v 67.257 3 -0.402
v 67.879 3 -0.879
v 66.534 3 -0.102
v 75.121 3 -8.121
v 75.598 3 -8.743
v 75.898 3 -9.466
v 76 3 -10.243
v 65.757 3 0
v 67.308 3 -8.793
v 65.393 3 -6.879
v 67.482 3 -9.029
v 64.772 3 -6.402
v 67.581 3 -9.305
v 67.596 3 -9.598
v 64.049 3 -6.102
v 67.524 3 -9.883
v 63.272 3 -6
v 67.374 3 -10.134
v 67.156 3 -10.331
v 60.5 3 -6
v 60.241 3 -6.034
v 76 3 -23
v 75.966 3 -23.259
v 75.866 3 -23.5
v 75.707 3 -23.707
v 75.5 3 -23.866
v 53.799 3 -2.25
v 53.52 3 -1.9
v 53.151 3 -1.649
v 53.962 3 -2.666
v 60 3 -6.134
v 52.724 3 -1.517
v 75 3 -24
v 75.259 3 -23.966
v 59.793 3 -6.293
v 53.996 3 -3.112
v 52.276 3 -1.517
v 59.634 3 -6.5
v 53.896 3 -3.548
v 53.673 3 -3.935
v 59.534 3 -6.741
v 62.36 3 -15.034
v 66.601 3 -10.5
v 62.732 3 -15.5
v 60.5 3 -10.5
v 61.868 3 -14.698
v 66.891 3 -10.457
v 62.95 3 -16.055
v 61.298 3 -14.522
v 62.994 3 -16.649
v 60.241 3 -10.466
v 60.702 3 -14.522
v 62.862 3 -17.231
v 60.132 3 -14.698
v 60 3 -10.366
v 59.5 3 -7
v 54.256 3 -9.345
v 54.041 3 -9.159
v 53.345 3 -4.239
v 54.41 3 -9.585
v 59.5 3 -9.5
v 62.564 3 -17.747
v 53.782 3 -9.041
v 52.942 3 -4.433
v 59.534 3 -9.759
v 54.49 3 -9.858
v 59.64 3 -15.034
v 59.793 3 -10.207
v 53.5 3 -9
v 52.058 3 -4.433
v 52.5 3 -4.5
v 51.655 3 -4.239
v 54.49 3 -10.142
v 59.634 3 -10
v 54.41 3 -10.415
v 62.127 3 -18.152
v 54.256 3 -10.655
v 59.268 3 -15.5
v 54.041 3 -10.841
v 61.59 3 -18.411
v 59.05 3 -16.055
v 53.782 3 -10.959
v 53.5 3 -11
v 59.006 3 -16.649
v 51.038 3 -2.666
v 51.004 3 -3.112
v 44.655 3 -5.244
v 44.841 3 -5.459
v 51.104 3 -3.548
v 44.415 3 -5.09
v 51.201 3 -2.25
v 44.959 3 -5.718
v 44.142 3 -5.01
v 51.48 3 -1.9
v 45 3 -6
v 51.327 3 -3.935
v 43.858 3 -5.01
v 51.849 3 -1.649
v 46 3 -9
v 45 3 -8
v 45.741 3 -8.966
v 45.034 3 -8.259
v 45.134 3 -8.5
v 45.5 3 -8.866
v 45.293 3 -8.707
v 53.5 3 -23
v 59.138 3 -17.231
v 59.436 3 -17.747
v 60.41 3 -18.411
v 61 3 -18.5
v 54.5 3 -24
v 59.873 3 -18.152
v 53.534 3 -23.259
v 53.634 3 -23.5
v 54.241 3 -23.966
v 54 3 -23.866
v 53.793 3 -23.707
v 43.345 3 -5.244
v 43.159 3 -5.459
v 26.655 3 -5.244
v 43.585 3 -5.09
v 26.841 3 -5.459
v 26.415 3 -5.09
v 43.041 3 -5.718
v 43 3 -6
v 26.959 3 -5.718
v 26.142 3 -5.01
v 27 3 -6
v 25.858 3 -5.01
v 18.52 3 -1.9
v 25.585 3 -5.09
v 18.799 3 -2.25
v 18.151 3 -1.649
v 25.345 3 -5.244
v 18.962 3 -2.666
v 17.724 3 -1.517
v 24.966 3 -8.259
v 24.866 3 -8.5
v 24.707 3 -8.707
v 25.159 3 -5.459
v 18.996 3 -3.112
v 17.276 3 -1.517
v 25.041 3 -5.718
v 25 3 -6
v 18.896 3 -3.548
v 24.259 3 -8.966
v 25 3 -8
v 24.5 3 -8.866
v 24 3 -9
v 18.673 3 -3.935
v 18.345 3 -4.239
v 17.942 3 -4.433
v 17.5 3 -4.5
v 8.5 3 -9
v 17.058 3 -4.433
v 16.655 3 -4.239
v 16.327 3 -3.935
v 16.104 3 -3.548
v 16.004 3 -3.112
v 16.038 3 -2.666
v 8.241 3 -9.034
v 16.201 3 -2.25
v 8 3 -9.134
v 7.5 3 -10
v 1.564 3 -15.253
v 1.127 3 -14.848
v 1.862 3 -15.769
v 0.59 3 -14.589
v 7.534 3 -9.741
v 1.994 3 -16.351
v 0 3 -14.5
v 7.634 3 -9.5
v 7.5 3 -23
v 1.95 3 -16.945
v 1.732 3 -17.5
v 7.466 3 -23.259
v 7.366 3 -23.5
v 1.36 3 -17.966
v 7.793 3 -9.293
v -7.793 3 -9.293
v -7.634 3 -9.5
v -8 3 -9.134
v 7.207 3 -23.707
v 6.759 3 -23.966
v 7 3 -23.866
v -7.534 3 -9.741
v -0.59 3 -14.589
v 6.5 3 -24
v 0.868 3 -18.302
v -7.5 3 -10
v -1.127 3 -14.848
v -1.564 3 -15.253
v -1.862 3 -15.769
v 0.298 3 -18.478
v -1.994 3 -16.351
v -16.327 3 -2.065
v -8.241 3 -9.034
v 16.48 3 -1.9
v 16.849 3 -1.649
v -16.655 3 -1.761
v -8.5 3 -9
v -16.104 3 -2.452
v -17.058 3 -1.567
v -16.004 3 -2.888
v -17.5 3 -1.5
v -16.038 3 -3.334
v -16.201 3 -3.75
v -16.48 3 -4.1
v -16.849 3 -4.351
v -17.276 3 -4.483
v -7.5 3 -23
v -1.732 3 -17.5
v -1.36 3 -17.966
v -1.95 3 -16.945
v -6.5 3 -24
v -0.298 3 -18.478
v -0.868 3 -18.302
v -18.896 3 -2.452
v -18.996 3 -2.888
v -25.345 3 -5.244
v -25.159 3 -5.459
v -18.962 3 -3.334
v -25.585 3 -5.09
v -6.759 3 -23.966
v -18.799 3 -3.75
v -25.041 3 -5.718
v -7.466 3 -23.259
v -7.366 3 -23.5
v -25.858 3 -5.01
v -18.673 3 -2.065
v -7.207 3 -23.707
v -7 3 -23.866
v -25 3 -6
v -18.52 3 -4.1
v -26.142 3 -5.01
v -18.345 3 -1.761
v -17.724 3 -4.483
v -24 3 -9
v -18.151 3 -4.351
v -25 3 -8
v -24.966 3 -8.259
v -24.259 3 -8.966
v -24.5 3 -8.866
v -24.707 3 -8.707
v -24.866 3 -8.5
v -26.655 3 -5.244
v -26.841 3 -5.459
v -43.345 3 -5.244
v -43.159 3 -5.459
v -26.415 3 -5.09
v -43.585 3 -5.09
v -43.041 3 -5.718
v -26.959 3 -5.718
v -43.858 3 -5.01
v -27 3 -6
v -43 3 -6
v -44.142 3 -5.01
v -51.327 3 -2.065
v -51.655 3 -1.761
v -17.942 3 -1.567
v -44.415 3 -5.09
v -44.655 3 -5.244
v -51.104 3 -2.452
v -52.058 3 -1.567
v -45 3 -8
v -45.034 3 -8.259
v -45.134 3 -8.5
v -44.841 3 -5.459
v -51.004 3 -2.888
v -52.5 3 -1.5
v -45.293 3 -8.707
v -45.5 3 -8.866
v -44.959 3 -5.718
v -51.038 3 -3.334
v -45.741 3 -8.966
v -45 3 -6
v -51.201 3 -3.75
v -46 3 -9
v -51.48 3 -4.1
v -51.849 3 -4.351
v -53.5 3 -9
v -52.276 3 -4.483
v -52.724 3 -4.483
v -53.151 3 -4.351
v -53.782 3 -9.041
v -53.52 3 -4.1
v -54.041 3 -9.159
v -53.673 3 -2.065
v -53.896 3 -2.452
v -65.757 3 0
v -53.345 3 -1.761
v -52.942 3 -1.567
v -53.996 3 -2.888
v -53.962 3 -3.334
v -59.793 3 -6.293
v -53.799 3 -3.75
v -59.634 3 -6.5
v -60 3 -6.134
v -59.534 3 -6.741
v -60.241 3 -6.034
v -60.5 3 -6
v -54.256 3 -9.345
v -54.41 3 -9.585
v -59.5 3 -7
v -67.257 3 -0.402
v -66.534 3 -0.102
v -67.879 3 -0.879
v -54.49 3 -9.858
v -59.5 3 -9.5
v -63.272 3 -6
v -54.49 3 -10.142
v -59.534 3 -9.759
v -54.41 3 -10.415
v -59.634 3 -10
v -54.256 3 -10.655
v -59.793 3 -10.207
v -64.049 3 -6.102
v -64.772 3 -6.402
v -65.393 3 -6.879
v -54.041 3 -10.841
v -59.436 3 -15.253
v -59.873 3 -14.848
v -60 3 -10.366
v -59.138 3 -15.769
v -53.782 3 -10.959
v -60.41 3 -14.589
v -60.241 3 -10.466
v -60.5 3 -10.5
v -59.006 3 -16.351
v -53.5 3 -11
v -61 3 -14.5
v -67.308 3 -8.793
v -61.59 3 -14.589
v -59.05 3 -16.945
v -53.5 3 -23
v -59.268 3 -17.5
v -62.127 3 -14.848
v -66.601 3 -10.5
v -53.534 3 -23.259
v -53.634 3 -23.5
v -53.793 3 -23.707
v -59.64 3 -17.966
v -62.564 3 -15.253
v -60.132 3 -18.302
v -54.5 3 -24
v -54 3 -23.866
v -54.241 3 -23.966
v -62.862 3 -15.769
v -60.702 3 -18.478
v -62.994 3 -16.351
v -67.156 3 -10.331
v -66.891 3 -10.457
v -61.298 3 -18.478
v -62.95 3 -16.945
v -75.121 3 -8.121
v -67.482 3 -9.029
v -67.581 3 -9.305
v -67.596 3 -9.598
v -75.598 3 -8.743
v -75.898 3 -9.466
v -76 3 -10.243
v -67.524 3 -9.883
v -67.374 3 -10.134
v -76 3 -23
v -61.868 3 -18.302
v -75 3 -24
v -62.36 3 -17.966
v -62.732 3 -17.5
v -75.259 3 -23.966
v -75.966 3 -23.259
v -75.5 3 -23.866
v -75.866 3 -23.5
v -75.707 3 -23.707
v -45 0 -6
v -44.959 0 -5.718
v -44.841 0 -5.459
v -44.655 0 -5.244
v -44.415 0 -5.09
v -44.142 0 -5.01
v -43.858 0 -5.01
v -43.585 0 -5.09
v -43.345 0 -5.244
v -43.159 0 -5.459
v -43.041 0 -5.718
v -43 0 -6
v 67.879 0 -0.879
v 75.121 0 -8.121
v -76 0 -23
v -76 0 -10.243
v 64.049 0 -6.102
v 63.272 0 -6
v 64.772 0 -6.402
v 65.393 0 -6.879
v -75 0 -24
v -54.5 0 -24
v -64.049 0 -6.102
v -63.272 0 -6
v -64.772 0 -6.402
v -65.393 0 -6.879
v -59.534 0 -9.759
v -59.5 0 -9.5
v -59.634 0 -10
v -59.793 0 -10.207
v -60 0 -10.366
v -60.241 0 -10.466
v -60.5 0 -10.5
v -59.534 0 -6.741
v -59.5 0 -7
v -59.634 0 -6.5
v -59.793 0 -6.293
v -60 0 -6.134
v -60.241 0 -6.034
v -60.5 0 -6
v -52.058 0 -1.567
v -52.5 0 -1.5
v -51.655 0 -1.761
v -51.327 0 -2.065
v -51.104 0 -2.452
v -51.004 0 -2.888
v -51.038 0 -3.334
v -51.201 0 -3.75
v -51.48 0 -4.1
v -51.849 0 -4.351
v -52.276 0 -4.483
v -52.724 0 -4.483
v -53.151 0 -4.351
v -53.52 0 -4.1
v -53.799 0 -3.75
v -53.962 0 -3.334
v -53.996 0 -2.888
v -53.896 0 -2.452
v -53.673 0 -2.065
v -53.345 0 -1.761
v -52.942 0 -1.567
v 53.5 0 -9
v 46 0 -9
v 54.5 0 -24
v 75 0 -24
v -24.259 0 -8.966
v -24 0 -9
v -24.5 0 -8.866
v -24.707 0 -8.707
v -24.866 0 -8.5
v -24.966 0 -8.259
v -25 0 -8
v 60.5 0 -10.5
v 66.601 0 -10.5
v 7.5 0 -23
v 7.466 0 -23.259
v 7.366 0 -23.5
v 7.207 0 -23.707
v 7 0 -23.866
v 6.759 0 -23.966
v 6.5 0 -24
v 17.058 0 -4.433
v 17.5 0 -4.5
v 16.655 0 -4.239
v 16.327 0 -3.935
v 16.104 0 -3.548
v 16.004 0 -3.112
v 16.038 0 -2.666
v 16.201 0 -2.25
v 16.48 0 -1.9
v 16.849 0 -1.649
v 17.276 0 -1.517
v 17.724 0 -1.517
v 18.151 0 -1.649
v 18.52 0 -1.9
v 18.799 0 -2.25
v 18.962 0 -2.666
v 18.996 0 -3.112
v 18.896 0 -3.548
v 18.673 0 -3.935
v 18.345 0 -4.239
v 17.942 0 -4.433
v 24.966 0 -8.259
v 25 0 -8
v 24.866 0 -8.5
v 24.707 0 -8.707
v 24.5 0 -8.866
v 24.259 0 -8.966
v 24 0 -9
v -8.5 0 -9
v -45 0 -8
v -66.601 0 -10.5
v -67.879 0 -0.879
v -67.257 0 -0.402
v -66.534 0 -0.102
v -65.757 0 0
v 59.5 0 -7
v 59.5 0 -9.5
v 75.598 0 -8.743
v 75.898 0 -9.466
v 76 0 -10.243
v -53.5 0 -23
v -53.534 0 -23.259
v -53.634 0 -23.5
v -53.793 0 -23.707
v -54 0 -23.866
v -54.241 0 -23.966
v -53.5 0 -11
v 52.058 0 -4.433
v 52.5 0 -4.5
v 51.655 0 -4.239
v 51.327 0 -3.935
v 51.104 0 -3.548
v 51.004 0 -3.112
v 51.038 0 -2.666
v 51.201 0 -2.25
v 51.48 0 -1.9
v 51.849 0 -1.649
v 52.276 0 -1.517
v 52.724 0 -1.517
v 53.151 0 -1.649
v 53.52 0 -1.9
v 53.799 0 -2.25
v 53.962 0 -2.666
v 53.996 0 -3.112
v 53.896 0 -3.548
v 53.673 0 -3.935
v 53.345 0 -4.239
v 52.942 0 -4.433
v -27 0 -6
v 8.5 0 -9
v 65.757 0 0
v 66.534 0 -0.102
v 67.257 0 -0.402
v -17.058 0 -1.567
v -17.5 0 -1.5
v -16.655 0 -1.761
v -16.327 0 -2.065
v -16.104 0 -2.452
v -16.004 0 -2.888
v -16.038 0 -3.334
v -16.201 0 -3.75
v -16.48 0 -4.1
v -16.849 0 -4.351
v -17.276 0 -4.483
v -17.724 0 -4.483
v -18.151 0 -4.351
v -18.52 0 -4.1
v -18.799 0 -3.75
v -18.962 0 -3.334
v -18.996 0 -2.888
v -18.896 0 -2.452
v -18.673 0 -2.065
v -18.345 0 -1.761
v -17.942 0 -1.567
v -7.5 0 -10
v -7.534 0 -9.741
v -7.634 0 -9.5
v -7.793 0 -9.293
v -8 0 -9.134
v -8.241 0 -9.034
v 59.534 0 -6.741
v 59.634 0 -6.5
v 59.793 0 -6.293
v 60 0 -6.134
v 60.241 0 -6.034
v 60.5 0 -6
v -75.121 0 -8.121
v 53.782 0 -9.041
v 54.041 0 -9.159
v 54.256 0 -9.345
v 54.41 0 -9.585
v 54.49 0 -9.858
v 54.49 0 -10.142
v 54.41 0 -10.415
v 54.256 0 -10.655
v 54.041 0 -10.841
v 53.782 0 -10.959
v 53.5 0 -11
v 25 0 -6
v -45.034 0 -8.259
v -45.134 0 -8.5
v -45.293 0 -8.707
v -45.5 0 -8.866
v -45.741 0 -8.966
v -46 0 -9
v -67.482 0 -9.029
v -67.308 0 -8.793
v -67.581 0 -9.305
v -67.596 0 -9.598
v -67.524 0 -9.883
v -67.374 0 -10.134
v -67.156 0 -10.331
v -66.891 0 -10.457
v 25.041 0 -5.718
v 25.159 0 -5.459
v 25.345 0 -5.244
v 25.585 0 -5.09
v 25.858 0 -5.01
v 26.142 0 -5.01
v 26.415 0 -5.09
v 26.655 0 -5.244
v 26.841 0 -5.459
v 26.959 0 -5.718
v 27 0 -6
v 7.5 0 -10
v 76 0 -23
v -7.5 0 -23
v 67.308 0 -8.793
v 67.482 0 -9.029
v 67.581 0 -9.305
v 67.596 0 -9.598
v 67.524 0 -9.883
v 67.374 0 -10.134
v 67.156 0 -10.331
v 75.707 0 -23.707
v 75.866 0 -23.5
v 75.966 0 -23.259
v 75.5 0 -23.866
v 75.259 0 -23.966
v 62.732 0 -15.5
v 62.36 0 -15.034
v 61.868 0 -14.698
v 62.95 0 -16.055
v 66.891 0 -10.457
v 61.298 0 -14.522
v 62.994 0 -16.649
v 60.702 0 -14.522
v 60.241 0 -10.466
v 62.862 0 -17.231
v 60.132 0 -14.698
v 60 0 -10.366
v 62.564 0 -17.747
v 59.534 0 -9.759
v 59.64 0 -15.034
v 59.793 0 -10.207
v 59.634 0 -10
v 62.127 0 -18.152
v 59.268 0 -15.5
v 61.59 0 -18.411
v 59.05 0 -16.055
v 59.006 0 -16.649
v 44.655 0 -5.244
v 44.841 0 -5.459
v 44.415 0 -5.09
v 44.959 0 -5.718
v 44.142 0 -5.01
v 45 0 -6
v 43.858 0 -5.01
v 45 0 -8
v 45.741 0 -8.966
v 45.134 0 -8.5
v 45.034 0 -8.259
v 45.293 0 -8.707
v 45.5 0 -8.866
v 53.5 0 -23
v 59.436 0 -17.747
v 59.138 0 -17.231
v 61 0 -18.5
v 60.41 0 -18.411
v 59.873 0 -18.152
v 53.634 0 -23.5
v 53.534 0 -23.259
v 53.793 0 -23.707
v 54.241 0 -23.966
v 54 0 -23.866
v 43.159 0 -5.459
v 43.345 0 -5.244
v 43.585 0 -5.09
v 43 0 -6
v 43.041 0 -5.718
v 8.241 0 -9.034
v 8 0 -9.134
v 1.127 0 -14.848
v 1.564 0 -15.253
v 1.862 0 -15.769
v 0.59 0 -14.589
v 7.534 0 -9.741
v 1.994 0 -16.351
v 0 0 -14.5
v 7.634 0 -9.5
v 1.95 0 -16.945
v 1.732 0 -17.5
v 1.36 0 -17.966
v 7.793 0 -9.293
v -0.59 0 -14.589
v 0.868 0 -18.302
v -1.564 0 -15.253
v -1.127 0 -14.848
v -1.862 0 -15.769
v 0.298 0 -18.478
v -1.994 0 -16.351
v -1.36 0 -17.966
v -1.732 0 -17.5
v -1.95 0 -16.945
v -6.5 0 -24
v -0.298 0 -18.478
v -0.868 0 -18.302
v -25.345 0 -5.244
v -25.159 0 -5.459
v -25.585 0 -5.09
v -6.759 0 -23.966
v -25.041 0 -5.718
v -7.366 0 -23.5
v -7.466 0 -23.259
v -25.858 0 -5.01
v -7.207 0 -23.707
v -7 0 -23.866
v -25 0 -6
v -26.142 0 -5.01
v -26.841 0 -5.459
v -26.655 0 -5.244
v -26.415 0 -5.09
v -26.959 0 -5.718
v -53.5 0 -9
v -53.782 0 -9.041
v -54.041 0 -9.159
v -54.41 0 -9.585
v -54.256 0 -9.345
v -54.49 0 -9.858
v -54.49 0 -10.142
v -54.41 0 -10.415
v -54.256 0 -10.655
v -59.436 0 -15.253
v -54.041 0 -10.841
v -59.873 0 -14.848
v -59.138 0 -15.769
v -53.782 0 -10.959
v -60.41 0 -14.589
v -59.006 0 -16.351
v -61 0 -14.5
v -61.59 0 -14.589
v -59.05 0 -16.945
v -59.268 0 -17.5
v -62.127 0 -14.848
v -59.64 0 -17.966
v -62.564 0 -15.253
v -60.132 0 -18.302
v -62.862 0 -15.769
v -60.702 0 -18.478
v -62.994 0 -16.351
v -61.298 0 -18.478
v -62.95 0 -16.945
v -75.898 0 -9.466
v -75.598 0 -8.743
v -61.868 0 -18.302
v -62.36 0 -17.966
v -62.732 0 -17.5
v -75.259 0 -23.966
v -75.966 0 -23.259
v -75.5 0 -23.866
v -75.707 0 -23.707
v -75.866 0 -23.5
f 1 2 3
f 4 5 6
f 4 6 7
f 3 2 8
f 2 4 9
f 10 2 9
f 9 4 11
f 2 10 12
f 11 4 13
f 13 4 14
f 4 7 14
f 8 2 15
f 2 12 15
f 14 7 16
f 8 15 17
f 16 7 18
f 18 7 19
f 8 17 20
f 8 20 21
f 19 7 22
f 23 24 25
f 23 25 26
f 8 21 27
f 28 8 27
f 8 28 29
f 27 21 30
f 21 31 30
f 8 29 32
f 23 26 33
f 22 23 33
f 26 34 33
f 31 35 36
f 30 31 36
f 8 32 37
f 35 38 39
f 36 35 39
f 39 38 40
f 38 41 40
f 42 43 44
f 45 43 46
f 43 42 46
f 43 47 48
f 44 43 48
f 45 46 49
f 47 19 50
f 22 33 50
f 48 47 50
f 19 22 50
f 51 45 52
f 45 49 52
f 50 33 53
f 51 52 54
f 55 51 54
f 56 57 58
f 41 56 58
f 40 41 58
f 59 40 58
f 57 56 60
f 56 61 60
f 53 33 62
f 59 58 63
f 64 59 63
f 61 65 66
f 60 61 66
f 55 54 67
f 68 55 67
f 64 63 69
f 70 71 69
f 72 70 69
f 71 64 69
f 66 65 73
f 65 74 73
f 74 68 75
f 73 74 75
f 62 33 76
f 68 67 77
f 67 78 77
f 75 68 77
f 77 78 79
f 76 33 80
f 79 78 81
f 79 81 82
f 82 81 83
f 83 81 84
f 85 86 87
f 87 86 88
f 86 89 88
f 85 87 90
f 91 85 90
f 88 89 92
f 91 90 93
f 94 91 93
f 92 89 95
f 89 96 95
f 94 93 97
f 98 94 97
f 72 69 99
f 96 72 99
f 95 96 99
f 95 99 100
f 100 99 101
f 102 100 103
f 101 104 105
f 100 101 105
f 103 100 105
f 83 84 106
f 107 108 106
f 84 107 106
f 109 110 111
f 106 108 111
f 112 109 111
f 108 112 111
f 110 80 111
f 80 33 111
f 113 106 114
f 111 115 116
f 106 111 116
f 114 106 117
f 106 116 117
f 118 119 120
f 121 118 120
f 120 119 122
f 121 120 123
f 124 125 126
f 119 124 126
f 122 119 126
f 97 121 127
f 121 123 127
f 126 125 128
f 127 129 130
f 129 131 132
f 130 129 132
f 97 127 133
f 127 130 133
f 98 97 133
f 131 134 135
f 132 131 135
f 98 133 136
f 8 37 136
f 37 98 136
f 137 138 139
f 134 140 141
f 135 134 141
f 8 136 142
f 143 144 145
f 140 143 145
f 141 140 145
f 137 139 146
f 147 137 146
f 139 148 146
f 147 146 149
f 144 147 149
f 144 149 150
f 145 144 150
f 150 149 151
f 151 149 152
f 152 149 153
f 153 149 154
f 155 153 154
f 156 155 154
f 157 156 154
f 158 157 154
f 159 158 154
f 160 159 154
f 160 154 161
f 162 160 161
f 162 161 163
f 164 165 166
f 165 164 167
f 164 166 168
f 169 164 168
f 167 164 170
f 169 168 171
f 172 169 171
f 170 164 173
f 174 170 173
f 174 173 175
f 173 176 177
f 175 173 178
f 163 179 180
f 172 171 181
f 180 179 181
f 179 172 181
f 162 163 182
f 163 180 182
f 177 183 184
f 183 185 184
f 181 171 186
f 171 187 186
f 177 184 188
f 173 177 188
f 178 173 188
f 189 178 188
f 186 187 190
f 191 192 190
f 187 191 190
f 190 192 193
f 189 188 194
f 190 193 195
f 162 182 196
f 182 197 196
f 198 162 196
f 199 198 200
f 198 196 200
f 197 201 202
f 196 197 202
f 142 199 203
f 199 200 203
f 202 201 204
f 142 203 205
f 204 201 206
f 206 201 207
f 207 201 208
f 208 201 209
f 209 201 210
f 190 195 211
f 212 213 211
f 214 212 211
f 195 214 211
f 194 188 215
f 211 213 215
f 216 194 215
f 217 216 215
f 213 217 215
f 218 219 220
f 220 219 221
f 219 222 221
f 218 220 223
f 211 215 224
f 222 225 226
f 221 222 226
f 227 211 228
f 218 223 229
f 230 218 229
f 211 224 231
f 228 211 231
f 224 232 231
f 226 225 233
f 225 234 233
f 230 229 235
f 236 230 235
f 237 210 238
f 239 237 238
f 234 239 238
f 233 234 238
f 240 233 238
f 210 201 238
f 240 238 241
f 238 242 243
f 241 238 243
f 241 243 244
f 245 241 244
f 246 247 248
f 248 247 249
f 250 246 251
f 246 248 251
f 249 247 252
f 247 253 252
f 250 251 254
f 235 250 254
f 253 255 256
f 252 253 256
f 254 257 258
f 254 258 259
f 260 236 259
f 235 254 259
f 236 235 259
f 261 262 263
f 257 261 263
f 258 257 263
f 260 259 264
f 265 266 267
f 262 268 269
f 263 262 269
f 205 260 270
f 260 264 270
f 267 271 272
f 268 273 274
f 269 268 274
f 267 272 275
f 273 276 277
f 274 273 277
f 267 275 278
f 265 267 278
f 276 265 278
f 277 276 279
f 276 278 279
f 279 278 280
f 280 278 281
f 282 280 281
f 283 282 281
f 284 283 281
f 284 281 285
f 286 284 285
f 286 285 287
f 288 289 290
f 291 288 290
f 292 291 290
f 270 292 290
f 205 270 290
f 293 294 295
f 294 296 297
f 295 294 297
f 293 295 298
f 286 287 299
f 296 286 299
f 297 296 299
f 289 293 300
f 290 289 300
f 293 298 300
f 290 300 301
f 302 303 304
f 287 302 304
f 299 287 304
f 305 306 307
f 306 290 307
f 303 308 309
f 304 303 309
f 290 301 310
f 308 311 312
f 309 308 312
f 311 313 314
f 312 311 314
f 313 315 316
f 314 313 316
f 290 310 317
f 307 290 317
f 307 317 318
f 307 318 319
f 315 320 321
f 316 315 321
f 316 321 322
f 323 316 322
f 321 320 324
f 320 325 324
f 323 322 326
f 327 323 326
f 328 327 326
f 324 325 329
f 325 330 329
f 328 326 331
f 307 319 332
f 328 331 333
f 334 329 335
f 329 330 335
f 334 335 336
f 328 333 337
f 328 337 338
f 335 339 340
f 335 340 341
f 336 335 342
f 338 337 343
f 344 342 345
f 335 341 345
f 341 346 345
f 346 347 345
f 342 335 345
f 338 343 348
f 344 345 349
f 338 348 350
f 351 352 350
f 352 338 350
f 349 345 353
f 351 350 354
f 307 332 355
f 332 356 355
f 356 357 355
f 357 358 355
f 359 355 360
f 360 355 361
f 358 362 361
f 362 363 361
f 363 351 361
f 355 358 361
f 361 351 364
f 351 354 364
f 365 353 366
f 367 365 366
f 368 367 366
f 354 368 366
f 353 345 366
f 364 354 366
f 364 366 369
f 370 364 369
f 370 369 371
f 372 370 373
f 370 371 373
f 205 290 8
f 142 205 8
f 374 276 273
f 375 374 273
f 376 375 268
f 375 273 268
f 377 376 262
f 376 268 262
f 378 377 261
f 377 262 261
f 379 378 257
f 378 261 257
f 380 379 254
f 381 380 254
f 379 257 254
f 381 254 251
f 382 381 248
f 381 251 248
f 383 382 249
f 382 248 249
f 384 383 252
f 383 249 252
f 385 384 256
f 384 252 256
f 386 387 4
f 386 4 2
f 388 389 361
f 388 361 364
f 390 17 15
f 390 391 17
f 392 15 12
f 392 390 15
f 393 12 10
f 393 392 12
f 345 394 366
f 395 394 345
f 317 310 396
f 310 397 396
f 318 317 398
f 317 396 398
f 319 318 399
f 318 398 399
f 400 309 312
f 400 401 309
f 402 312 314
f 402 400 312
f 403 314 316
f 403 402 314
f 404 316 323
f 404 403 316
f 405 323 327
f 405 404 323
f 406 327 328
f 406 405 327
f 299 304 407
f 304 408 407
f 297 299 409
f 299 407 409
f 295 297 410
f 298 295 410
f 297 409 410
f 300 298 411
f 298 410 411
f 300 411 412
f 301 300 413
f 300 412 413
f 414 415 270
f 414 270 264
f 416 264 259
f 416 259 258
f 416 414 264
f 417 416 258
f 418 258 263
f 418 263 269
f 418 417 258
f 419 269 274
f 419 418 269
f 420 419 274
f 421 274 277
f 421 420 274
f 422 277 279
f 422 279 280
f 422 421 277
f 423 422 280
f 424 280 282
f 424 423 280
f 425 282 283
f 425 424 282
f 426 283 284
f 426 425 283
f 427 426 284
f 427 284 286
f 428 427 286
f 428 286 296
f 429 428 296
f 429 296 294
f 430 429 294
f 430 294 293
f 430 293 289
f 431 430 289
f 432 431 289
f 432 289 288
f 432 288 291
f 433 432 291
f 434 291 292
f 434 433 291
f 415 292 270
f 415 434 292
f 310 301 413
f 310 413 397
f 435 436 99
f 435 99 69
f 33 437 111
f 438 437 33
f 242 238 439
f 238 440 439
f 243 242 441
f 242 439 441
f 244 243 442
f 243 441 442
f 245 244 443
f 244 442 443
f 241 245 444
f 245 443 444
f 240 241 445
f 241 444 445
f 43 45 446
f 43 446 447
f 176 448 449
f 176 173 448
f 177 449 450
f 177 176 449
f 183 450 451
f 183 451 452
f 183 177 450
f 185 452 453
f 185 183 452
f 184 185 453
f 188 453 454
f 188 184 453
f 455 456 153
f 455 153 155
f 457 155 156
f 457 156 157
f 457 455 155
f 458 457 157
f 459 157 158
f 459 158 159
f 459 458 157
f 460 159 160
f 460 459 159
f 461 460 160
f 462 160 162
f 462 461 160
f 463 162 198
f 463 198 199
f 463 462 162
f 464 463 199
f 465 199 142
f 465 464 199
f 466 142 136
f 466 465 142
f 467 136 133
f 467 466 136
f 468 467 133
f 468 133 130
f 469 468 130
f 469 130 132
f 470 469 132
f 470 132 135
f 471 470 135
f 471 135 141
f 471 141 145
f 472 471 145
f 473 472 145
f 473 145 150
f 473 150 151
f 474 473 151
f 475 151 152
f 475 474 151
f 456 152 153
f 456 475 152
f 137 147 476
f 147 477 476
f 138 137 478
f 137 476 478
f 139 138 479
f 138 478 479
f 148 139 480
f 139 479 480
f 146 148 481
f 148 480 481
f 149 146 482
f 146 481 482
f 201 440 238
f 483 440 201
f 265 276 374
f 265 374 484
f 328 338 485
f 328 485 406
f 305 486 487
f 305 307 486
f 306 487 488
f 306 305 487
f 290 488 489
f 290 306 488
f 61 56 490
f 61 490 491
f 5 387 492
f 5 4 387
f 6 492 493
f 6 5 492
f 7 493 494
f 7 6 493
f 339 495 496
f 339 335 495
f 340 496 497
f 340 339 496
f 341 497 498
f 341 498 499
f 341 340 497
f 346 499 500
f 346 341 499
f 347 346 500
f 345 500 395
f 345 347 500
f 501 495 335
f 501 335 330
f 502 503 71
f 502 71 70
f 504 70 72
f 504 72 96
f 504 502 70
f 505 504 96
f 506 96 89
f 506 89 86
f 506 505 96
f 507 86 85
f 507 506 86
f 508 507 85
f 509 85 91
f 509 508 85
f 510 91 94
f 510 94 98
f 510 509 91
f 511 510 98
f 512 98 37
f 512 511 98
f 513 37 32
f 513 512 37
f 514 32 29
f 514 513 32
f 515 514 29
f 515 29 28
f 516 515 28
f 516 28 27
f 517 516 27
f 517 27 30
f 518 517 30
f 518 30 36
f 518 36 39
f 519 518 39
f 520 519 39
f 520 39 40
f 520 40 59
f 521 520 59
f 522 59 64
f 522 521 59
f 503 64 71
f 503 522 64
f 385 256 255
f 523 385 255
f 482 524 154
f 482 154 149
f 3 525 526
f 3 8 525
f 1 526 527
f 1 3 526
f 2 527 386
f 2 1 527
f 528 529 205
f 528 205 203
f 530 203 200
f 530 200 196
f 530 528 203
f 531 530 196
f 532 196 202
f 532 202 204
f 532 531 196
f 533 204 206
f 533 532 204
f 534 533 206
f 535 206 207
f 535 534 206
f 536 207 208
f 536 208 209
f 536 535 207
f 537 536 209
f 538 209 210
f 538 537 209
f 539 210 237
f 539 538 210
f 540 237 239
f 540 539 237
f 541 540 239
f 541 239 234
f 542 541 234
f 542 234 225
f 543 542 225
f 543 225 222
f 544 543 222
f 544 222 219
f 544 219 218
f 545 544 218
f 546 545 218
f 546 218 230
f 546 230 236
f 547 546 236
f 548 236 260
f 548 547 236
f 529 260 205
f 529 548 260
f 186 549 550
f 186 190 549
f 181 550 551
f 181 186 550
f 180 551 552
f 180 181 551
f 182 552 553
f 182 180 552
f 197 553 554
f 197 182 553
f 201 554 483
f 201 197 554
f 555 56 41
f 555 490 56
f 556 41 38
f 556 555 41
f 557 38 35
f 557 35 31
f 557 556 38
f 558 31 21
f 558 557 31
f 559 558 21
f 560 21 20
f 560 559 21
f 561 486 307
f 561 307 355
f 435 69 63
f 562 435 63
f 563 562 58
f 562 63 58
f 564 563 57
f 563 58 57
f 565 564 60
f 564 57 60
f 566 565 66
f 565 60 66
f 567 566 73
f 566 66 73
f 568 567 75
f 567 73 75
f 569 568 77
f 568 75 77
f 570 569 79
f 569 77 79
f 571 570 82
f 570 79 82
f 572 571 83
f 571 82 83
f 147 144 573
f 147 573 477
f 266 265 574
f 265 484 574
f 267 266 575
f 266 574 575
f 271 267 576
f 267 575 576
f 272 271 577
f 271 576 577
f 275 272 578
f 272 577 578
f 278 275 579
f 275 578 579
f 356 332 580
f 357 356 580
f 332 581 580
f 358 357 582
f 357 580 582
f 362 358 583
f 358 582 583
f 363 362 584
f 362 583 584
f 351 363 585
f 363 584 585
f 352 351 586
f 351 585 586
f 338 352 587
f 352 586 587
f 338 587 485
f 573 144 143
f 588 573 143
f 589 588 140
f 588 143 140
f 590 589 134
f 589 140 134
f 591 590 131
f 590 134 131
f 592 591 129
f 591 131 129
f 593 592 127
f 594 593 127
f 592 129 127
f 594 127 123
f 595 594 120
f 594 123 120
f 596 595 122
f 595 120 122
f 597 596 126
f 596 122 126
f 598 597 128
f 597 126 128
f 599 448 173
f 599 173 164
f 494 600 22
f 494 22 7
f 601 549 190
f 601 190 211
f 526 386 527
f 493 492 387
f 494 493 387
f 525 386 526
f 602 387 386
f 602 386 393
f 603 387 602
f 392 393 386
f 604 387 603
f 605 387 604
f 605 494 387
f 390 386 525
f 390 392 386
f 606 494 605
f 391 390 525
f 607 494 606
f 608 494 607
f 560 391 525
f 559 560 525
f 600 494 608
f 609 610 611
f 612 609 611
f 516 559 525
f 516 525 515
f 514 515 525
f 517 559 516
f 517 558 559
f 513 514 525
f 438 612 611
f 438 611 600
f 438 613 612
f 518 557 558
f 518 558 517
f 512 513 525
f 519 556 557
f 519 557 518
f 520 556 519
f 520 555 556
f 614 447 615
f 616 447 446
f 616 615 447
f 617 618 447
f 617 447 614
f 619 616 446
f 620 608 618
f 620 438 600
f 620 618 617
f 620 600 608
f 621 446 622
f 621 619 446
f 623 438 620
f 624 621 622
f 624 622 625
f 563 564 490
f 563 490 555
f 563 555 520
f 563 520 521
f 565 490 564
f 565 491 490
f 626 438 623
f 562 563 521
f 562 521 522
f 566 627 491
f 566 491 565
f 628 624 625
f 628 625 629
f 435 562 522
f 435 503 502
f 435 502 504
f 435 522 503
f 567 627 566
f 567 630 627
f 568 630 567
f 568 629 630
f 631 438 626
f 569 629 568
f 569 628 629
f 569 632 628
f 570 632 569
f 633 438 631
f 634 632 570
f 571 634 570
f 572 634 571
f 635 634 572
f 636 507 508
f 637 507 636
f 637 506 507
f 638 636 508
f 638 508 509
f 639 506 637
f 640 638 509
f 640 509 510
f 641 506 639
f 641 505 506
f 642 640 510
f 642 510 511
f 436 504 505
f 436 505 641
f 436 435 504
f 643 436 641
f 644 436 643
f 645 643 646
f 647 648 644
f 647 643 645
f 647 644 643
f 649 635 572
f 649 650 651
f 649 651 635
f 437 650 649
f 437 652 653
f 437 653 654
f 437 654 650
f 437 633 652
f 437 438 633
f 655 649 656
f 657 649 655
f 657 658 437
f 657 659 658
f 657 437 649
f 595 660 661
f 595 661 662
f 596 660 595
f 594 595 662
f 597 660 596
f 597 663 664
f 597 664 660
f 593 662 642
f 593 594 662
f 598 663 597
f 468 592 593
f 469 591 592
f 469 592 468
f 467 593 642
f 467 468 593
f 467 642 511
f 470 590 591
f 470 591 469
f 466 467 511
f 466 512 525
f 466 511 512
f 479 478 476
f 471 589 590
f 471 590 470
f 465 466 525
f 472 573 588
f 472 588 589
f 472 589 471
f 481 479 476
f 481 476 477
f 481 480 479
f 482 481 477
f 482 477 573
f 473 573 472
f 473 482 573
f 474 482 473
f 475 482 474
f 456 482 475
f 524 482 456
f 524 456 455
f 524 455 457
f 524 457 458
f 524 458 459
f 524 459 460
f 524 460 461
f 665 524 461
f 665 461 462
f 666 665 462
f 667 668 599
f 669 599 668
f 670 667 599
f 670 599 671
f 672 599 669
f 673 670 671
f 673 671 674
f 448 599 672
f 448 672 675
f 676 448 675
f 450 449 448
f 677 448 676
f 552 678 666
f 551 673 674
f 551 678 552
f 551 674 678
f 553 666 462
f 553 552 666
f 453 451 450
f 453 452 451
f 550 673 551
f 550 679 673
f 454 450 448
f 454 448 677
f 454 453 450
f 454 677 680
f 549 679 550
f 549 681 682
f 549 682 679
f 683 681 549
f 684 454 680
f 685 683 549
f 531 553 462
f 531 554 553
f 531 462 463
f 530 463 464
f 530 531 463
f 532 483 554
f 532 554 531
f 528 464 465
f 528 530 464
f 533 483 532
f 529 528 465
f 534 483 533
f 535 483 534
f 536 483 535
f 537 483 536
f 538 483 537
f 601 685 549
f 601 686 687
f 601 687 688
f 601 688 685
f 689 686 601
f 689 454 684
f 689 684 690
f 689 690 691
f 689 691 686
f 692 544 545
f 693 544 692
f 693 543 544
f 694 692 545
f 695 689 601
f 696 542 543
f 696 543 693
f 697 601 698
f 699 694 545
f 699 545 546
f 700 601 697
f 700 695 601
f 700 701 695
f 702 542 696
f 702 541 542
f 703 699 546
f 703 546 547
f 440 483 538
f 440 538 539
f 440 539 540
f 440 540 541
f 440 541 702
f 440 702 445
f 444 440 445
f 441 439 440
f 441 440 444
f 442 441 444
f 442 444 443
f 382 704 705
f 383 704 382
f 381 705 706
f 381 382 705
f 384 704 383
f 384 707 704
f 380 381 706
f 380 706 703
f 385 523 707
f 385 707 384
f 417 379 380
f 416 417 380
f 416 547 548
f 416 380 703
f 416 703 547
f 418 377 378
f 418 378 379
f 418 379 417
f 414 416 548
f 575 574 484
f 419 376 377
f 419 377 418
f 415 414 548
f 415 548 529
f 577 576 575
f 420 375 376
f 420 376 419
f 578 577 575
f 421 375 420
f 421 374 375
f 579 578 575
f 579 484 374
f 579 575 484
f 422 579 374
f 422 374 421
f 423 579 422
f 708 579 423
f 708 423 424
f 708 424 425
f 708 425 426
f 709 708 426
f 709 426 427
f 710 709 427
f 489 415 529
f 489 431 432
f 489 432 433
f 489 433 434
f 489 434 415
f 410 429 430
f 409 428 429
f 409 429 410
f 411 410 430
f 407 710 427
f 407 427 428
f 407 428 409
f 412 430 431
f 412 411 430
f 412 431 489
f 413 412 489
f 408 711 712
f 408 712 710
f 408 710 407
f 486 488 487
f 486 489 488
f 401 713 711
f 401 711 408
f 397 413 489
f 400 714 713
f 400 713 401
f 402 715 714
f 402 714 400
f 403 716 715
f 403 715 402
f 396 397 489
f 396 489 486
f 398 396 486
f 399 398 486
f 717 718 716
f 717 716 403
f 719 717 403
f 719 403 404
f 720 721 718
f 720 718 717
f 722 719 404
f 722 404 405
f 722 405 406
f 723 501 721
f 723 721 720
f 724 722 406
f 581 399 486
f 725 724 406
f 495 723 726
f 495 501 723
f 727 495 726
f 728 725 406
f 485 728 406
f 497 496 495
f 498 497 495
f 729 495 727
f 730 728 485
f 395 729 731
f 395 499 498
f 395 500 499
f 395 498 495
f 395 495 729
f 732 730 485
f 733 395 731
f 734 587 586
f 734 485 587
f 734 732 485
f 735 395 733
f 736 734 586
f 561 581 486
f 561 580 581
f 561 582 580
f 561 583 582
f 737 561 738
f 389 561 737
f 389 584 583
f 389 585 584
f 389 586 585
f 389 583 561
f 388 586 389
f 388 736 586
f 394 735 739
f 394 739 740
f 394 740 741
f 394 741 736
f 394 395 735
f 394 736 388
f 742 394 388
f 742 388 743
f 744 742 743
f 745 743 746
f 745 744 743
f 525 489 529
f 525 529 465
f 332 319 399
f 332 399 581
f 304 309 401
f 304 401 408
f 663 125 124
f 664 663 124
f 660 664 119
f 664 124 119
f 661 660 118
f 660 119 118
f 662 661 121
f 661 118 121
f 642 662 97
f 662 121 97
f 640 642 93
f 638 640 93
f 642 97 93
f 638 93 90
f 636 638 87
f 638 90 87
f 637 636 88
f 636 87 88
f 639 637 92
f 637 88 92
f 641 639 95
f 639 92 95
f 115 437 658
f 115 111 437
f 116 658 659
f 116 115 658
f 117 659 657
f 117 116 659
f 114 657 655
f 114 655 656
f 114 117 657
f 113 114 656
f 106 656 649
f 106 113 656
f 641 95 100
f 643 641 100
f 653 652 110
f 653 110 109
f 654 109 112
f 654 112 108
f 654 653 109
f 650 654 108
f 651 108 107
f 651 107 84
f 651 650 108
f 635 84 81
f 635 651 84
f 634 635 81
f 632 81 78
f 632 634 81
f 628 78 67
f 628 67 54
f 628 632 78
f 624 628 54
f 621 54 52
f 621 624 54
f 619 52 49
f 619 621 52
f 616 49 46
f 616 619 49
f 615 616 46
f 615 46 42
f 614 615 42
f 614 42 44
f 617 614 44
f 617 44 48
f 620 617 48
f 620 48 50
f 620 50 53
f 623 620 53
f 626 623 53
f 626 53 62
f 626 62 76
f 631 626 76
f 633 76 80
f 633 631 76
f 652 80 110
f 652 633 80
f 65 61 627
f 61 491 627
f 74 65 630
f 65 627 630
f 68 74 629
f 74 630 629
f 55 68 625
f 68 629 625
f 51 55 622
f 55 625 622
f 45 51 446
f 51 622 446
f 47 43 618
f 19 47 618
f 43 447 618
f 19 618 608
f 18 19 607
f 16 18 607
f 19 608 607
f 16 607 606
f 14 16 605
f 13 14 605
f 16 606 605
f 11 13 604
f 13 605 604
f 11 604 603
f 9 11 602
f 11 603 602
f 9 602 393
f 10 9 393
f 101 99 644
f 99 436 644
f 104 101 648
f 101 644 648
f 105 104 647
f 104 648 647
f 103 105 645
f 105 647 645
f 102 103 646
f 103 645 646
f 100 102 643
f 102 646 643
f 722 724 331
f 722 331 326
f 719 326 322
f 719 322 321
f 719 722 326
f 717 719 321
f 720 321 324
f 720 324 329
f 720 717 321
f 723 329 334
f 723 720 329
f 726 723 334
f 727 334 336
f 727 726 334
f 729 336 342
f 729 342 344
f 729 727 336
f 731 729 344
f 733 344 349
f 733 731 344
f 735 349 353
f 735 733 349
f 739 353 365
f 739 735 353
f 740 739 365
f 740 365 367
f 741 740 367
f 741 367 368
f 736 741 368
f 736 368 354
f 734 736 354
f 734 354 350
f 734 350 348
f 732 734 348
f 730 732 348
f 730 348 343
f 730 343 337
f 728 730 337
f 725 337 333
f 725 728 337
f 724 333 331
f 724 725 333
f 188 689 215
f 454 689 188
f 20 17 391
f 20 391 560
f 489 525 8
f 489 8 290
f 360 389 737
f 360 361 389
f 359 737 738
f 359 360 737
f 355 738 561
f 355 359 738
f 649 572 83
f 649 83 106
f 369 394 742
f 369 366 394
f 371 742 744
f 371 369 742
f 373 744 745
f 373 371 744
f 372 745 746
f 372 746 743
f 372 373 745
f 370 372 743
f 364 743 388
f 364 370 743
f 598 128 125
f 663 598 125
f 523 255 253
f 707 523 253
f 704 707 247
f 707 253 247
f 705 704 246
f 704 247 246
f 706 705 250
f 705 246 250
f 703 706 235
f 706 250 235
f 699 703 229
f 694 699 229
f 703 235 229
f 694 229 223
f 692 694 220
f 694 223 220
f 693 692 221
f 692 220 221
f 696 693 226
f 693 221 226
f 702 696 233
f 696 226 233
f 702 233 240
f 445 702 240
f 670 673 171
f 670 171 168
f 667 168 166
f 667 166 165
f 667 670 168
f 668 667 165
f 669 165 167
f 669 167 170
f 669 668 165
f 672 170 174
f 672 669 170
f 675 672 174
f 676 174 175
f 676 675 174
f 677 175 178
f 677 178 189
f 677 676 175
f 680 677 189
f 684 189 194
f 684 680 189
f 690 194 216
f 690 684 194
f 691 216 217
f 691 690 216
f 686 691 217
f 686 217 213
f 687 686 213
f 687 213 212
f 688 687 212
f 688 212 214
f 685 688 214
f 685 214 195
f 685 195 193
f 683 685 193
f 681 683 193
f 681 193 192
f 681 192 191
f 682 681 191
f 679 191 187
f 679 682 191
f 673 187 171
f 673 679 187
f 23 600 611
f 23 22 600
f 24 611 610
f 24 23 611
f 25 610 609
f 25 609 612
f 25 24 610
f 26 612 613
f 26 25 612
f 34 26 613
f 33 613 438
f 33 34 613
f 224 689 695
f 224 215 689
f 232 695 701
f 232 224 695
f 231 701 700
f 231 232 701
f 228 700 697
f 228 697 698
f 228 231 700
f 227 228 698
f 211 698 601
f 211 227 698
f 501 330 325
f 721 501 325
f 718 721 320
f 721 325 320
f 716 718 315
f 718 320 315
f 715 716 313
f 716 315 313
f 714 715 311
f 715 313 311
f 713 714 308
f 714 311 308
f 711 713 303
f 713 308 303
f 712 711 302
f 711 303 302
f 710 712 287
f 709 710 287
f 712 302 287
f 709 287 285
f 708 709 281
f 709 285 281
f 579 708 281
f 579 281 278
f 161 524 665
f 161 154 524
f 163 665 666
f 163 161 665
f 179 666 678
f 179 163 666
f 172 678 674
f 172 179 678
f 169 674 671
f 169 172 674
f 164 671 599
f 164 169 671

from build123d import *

# Parameters (mm, degrees)
SKETCH_1_R          = 2
SKETCH_1_R_2        = 1.5
EXTRUDE_1_DEPTH     = 3
SKETCH_2_W          = 20
SKETCH_2_H          = 3
CUT_EXTRUDE_1_DEPTH = 80.755877526
SKETCH_3_R          = 1
CUT_EXTRUDE_2_DEPTH = 80.755877526
FILLET_1_R          = 1
FILLET_2_R          = 3


with BuildPart() as part:
    # 草图1 → 凸台-拉伸1 (new body)
    with BuildSketch(Plane(origin=(0, 0, 0), x_dir=(1, 0, 0), z_dir=(0, 1, 0))):
        Polygon((-53.5, 24), (-53.5, 9), (-7.5, 9), (-7.5, 24), (7.5, 24), (7.5, 9), (53.5, 9), (53.5, 24), (76, 24), (76, 9), (67, 0), (-67, 0), (-76, 9), (-76, 24), align=None)
        with Locations(Location((-61, 16.5, 0), (0, 0, 270))):
            Circle(SKETCH_1_R, mode=Mode.SUBTRACT)
        with Locations(Location((-52.5, 3, 0), (0, 0, 270))):
            Circle(SKETCH_1_R_2, mode=Mode.SUBTRACT)
        with Locations(Location((-17.5, 3, 0), (0, 0, 270))):
            Circle(SKETCH_1_R_2, mode=Mode.SUBTRACT)
        with Locations(Location((0, 16.5, 0), (0, 0, 270))):
            Circle(SKETCH_1_R, mode=Mode.SUBTRACT)
        with Locations(Location((17.5, 3, 0), (0, 0, 90))):
            Circle(SKETCH_1_R_2, mode=Mode.SUBTRACT)
        with Locations(Location((52.5, 3, 0), (0, 0, 90))):
            Circle(SKETCH_1_R_2, mode=Mode.SUBTRACT)
        with Locations(Location((61, 16.5, 0), (0, 0, 90))):
            Circle(SKETCH_1_R, mode=Mode.SUBTRACT)
    extrude(amount=EXTRUDE_1_DEPTH)

    # 草图2 → 切除-拉伸1 (cut, through all)
    with BuildSketch(Plane(origin=(0, 3, 0), x_dir=(1, 0, 0), z_dir=(0, 1, 0))):
        with Locations((35, 7.5)):
            Rectangle(SKETCH_2_W, SKETCH_2_H)
        with Locations((-35, 7.5)):
            Rectangle(SKETCH_2_W, SKETCH_2_H)
        Polygon((-69.014718626, 10.5), (-59.5, 10.5), (-59.5, 6), (-64.514718626, 6), align=None)
        Polygon((64.514718626, 6), (59.5, 6), (59.5, 10.5), (69.014718626, 10.5), align=None)
    extrude(amount=-CUT_EXTRUDE_1_DEPTH, mode=Mode.SUBTRACT)

    # 草图3 → 切除-拉伸2 (cut, through all)
    with BuildSketch(Plane(origin=(0, 3, 0), x_dir=(1, 0, 0), z_dir=(0, 1, 0))):
        with Locations((-53.5, 10)):
            Circle(SKETCH_3_R)
        with Locations((-44, 6)):
            Circle(SKETCH_3_R)
        with Locations((-26, 6)):
            Circle(SKETCH_3_R)
        with Locations((26, 6)):
            Circle(SKETCH_3_R)
        with Locations((44, 6)):
            Circle(SKETCH_3_R)
        with Locations((53.5, 10)):
            Circle(SKETCH_3_R)
    extrude(amount=-CUT_EXTRUDE_2_DEPTH, mode=Mode.SUBTRACT)

    # 圆角1
    fillet_1_edges = [part.edges().sort_by_distance(p)[0] for p in [
        (45, 1.5, -9),
        (25, 1.5, -9),
        (-45, 1.5, -9),
        (-25, 1.5, -9),
        (-76, 1.5, -24),
        (-53.5, 1.5, -24),
        (-7.5, 1.5, -9),
        (-7.5, 1.5, -24),
        (7.5, 1.5, -24),
        (7.5, 1.5, -9),
        (53.5, 1.5, -24),
        (76, 1.5, -24),
        (69.014718626, 1.5, -10.5),
        (59.5, 1.5, -6),
        (59.5, 1.5, -10.5),
        (-59.5, 1.5, -6),
        (-69.014718626, 1.5, -10.5),
        (-59.5, 1.5, -10.5),
    ]]
    fillet(fillet_1_edges, radius=FILLET_1_R)

    # 圆角2
    fillet_2_edges = [part.edges().sort_by_distance(p)[0] for p in [
        (76, 1.5, -9),
        (67, 1.5, 0),
        (-67, 1.5, 0),
        (-76, 1.5, -9),
        (64.514718626, 1.5, -6),
        (-64.514718626, 1.5, -6),
    ]]
    fillet(fillet_2_edges, radius=FILLET_2_R)


solid = part.part
